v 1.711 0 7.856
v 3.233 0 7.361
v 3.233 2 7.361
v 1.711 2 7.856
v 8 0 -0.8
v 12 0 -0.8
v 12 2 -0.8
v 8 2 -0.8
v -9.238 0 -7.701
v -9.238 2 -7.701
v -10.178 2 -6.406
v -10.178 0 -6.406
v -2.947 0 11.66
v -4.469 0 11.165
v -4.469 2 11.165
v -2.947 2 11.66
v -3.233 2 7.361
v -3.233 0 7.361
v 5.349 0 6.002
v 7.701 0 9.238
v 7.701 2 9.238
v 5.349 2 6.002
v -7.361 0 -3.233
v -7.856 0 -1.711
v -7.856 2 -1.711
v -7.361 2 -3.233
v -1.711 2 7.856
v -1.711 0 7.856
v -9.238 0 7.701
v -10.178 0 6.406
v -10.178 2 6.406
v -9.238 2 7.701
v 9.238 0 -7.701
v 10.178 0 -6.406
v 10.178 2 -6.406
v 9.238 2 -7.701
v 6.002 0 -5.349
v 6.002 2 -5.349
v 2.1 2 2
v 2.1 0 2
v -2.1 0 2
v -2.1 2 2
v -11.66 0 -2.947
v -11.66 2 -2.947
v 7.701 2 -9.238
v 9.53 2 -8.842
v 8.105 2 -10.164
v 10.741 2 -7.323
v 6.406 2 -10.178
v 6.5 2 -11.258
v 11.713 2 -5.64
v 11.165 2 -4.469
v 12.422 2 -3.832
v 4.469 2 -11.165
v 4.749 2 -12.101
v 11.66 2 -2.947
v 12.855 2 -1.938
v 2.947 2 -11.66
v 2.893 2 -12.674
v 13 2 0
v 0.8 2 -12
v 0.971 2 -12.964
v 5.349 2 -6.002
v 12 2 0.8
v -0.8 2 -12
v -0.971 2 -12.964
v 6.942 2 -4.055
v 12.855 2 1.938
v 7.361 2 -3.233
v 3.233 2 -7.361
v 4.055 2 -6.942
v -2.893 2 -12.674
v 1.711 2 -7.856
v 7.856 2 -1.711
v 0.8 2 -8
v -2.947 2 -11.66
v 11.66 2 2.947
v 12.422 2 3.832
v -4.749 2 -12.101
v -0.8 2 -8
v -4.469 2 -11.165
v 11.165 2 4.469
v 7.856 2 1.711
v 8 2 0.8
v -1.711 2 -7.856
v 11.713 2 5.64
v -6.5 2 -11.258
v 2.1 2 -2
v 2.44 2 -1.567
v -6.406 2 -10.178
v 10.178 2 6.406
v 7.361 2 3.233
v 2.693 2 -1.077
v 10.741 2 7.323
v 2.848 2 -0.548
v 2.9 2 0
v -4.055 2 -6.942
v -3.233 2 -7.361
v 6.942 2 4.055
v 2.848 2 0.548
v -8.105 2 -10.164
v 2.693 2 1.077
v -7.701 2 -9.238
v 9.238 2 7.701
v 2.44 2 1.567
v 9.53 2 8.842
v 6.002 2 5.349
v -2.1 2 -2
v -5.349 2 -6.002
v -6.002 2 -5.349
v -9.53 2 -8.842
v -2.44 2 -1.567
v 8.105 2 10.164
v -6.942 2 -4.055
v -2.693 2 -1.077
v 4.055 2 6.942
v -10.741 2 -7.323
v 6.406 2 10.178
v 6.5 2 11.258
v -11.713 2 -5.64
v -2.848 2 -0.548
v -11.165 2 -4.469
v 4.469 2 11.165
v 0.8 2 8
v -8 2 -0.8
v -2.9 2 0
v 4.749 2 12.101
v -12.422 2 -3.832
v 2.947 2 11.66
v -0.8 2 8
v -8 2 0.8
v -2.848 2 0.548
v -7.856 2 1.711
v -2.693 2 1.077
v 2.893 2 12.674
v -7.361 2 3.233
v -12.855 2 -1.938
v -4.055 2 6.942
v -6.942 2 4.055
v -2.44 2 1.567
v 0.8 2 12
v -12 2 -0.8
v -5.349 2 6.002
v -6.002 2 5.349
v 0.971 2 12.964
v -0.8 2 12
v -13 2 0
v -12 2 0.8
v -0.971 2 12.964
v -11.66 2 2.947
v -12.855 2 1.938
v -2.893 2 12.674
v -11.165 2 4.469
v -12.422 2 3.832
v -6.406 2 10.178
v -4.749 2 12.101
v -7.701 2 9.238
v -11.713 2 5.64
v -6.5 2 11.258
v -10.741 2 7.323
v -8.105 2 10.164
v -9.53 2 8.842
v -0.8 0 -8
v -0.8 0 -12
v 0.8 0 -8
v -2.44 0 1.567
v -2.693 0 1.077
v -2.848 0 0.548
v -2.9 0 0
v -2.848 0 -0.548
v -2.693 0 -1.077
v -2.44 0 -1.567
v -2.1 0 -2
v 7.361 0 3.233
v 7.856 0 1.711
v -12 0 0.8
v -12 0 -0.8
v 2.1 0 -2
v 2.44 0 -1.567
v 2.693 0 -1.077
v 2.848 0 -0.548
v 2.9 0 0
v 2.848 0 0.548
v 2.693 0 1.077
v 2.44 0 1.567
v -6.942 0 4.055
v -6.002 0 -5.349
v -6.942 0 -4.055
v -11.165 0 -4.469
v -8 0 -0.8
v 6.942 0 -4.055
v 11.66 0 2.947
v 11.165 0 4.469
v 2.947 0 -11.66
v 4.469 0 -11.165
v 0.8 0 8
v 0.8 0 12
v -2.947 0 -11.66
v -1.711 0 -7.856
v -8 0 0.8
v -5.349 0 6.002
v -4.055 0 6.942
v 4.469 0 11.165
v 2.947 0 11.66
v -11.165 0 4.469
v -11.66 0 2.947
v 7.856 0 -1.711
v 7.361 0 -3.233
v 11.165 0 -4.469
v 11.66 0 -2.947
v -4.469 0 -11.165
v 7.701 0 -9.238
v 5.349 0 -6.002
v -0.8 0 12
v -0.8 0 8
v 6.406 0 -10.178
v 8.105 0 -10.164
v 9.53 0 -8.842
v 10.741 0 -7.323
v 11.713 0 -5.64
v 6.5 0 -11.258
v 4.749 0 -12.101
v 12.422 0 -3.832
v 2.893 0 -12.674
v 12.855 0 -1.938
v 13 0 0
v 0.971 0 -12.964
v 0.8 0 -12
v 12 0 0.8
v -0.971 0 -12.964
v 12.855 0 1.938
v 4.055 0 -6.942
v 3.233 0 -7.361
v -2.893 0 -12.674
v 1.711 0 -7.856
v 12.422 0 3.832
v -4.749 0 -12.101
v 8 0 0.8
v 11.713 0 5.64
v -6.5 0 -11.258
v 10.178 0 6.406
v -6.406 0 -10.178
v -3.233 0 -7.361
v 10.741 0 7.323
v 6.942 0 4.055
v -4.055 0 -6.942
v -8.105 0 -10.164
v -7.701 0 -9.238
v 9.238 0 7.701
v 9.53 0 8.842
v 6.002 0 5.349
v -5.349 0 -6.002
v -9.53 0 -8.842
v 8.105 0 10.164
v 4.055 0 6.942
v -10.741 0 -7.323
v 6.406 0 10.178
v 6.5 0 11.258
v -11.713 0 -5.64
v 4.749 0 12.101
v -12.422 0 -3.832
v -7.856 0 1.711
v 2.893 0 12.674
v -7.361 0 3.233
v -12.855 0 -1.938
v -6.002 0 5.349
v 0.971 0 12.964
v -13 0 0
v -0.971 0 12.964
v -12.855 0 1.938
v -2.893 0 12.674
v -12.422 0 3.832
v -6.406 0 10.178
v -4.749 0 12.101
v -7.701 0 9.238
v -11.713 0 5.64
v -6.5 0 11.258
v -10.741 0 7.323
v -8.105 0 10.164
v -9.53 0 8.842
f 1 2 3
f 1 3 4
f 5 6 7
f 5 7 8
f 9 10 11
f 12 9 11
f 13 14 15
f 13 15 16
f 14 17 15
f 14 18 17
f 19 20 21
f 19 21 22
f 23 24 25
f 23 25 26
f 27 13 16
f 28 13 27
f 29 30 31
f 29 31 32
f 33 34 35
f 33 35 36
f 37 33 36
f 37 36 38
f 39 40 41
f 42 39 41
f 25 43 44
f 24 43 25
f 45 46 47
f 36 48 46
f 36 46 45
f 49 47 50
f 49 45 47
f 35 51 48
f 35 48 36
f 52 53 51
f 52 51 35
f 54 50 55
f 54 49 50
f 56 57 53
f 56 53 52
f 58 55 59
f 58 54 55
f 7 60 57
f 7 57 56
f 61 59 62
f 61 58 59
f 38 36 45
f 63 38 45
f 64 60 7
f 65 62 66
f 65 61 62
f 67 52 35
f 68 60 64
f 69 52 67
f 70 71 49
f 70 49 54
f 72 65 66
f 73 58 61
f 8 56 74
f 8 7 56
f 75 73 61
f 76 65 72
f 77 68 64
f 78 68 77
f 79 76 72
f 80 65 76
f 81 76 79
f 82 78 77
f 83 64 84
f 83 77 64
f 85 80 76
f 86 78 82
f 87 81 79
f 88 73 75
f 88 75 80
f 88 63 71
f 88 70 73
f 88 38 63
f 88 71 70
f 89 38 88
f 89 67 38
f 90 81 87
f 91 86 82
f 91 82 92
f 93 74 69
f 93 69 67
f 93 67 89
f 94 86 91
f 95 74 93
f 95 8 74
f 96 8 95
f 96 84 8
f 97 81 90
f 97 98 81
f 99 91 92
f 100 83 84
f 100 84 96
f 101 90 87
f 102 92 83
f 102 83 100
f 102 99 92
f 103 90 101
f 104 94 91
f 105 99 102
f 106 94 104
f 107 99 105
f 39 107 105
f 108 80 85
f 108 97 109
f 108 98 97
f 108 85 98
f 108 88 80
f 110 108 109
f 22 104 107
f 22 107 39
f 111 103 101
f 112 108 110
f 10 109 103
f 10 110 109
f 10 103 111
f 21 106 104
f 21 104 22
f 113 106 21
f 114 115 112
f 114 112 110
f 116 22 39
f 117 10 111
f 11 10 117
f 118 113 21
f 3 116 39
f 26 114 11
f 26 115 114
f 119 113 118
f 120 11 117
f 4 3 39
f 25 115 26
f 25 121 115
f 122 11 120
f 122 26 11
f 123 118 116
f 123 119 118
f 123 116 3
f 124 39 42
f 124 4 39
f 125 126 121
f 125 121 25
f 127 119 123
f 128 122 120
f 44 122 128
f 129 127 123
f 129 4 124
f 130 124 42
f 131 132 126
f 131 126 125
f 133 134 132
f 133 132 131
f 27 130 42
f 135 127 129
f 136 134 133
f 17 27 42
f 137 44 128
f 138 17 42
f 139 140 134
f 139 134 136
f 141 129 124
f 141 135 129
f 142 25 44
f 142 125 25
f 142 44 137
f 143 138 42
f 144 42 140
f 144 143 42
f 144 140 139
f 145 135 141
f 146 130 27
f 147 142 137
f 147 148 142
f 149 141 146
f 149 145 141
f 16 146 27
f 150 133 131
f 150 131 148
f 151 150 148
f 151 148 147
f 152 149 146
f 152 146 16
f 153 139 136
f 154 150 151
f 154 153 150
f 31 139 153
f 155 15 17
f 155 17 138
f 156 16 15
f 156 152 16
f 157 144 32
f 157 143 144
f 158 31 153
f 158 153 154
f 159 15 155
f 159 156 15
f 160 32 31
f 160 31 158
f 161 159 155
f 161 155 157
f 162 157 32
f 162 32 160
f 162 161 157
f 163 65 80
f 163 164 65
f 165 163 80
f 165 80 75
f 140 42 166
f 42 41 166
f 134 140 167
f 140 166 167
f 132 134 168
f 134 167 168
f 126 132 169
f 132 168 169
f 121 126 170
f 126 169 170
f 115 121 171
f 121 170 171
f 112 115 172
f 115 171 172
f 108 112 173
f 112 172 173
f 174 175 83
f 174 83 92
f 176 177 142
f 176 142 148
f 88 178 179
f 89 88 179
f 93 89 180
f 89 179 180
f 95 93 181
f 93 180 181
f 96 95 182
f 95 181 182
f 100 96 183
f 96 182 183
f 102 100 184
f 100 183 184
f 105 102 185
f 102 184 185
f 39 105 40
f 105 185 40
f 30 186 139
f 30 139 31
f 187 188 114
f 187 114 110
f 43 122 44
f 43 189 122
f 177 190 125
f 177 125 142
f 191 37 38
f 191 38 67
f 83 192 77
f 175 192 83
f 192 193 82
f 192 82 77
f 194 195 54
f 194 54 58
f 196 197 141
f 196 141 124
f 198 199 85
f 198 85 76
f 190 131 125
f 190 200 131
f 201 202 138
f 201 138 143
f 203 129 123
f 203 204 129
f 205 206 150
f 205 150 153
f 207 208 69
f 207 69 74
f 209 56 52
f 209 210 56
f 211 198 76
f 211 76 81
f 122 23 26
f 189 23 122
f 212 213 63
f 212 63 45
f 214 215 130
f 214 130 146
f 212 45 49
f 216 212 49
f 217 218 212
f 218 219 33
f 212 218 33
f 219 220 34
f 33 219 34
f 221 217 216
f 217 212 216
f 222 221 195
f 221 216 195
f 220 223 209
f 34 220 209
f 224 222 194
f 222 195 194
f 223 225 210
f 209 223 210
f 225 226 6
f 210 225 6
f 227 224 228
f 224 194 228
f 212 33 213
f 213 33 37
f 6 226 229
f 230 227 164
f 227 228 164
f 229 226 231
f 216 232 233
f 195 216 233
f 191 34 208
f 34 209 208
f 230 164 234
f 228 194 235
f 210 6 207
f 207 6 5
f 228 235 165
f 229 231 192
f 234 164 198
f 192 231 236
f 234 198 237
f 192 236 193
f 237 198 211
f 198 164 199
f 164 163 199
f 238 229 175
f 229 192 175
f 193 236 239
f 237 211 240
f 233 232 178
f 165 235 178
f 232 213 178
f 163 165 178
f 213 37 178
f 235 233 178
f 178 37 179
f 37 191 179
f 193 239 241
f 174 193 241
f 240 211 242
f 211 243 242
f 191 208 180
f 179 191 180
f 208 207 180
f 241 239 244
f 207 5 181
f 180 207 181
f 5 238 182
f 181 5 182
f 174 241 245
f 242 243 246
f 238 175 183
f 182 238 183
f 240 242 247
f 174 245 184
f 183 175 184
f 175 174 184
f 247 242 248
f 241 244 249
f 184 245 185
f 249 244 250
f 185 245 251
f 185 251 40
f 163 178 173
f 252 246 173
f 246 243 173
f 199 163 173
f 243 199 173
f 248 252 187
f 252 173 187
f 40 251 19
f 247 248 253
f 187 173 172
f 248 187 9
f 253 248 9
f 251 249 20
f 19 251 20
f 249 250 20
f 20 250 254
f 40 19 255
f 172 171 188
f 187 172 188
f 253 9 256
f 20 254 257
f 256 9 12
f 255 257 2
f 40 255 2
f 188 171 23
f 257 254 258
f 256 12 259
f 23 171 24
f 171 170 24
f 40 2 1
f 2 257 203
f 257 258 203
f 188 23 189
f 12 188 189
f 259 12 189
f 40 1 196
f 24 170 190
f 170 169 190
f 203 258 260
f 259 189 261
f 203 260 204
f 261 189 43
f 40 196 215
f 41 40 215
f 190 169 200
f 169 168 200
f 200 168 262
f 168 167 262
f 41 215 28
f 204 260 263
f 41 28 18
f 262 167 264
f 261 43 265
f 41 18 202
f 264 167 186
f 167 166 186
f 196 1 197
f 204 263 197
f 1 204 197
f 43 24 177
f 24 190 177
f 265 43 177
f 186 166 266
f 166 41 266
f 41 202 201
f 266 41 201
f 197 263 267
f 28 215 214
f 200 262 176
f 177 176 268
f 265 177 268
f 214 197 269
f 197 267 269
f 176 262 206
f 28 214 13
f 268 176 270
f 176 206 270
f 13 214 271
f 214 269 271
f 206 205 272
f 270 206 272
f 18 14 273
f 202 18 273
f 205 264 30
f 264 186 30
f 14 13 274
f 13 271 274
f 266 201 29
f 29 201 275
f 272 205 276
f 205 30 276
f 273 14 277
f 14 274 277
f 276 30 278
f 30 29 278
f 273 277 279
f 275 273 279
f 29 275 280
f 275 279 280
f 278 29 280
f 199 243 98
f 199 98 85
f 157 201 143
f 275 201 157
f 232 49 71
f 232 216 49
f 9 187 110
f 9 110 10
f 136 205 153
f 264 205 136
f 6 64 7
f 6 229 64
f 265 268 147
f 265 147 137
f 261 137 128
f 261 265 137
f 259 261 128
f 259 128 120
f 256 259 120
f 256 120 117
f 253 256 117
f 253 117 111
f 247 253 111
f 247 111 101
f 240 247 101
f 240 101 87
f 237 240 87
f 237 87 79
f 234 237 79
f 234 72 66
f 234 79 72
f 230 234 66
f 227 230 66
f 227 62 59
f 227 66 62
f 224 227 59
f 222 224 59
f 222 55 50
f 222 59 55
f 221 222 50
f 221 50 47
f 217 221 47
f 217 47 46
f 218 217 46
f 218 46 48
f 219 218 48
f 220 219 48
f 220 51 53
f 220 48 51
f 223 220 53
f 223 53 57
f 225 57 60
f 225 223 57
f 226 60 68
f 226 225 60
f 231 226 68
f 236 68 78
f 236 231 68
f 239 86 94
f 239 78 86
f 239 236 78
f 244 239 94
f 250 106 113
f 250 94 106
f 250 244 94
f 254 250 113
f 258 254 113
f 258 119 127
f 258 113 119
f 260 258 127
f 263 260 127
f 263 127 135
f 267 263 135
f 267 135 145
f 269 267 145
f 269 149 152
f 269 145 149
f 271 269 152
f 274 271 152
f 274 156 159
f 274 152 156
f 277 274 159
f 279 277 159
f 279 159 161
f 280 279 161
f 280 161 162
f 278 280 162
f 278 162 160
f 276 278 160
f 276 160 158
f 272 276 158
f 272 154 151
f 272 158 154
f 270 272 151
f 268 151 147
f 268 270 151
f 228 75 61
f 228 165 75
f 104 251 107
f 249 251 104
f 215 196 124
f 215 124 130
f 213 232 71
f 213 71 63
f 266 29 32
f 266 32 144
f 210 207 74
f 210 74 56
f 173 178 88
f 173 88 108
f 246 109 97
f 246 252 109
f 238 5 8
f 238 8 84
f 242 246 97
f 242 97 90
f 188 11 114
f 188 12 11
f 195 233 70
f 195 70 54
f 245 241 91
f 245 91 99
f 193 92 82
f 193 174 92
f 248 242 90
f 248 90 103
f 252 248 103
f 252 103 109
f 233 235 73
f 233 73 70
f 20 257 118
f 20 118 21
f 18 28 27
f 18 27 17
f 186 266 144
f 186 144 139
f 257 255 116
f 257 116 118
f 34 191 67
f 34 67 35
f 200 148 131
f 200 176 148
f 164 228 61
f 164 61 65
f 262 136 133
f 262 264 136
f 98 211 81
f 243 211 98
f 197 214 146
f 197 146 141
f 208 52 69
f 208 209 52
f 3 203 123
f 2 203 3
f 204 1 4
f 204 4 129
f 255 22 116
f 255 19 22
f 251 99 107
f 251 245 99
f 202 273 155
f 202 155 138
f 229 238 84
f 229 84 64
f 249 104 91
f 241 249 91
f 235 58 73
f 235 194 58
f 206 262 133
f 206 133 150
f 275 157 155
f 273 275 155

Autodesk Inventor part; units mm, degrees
ref_plane "YZ Plane" through (0, 0, 0) normal (1, 0, 0) x (0, 1, 0)
ref_plane "XZ Plane" through (0, 0, 0) normal (0, 1, 0) x (-1, 0, 0)
ref_plane "XY Plane" through (0, 0, 0) normal (0, 0, 1) x (1, 0, 0)
sketch "Esboço1" plane through (0, 0, 0) normal (0, 1, 0) x (-1, 0, 0)
  line L0 (-2.1, 2) -> (2.1, 2)
  line L1 (-2.1, -2) -> (2.1, -2)
  arc A0 (-2.1, 2) -> (-2.1, -2) centre (0, 0) ccw
  arc A1 (2.1, -2) -> (2.1, 2) centre (0, 0) ccw
  circle A2 centre (0, 0) radius 13
  line L2 (0, -18.2) -> (0, 18.2) projected
  dimension "d2" = 2
  dimension "d3" = 2
  dimension "d4" = 2.9
  dimension "d5" = 2.9
  dimension "d40" = 2
  dimension "d41" = 26
extrude "Extrusão4" add sketch "Esboço1" along normal blind 2 contours A0 L1 L2 A2 L0 | L2 A2 L1 A1 L0
sketch "Esboço17" plane through (0, 0, 0) normal (0, -1, 0) x (1, 0, 0)
  line L0 (-0.8, 12) -> (0.8, 12)
  line L1 (0.8, 12) -> (0.8, 8)
  line L2 (0.8, 8) -> (-0.8, 8)
  line L3 (-0.8, 8) -> (-0.8, 12)
  line L4 (0, 18.2) -> (0, -18.2) projected
  point P0 (0, 0)
  point P1 (0, 8)
  dimension "d114" = 8
  dimension "d115" = 4
  dimension "d116" = 0.8
  dimension "d117" = 0.8
extrude "Extrusão14" cut sketch "Esboço17" against normal through all
pattern_circular "Padrão circular10" count 20 over 360 about axis through (0, 0, 0) along (0, 1, 0) of "Extrusão14"
ref_plane "Plano de trabalho4" through (0, 1, 0) normal (0, -1, 0) x (1, 0, 0)
equation "\"d2\" = d40"
equation "\"d3\" = d40"
equation "\"d4\" = d5"
equation "\"d117\" = d116"
properties part number "Encoder Disco-Novo-12-furos-04"
